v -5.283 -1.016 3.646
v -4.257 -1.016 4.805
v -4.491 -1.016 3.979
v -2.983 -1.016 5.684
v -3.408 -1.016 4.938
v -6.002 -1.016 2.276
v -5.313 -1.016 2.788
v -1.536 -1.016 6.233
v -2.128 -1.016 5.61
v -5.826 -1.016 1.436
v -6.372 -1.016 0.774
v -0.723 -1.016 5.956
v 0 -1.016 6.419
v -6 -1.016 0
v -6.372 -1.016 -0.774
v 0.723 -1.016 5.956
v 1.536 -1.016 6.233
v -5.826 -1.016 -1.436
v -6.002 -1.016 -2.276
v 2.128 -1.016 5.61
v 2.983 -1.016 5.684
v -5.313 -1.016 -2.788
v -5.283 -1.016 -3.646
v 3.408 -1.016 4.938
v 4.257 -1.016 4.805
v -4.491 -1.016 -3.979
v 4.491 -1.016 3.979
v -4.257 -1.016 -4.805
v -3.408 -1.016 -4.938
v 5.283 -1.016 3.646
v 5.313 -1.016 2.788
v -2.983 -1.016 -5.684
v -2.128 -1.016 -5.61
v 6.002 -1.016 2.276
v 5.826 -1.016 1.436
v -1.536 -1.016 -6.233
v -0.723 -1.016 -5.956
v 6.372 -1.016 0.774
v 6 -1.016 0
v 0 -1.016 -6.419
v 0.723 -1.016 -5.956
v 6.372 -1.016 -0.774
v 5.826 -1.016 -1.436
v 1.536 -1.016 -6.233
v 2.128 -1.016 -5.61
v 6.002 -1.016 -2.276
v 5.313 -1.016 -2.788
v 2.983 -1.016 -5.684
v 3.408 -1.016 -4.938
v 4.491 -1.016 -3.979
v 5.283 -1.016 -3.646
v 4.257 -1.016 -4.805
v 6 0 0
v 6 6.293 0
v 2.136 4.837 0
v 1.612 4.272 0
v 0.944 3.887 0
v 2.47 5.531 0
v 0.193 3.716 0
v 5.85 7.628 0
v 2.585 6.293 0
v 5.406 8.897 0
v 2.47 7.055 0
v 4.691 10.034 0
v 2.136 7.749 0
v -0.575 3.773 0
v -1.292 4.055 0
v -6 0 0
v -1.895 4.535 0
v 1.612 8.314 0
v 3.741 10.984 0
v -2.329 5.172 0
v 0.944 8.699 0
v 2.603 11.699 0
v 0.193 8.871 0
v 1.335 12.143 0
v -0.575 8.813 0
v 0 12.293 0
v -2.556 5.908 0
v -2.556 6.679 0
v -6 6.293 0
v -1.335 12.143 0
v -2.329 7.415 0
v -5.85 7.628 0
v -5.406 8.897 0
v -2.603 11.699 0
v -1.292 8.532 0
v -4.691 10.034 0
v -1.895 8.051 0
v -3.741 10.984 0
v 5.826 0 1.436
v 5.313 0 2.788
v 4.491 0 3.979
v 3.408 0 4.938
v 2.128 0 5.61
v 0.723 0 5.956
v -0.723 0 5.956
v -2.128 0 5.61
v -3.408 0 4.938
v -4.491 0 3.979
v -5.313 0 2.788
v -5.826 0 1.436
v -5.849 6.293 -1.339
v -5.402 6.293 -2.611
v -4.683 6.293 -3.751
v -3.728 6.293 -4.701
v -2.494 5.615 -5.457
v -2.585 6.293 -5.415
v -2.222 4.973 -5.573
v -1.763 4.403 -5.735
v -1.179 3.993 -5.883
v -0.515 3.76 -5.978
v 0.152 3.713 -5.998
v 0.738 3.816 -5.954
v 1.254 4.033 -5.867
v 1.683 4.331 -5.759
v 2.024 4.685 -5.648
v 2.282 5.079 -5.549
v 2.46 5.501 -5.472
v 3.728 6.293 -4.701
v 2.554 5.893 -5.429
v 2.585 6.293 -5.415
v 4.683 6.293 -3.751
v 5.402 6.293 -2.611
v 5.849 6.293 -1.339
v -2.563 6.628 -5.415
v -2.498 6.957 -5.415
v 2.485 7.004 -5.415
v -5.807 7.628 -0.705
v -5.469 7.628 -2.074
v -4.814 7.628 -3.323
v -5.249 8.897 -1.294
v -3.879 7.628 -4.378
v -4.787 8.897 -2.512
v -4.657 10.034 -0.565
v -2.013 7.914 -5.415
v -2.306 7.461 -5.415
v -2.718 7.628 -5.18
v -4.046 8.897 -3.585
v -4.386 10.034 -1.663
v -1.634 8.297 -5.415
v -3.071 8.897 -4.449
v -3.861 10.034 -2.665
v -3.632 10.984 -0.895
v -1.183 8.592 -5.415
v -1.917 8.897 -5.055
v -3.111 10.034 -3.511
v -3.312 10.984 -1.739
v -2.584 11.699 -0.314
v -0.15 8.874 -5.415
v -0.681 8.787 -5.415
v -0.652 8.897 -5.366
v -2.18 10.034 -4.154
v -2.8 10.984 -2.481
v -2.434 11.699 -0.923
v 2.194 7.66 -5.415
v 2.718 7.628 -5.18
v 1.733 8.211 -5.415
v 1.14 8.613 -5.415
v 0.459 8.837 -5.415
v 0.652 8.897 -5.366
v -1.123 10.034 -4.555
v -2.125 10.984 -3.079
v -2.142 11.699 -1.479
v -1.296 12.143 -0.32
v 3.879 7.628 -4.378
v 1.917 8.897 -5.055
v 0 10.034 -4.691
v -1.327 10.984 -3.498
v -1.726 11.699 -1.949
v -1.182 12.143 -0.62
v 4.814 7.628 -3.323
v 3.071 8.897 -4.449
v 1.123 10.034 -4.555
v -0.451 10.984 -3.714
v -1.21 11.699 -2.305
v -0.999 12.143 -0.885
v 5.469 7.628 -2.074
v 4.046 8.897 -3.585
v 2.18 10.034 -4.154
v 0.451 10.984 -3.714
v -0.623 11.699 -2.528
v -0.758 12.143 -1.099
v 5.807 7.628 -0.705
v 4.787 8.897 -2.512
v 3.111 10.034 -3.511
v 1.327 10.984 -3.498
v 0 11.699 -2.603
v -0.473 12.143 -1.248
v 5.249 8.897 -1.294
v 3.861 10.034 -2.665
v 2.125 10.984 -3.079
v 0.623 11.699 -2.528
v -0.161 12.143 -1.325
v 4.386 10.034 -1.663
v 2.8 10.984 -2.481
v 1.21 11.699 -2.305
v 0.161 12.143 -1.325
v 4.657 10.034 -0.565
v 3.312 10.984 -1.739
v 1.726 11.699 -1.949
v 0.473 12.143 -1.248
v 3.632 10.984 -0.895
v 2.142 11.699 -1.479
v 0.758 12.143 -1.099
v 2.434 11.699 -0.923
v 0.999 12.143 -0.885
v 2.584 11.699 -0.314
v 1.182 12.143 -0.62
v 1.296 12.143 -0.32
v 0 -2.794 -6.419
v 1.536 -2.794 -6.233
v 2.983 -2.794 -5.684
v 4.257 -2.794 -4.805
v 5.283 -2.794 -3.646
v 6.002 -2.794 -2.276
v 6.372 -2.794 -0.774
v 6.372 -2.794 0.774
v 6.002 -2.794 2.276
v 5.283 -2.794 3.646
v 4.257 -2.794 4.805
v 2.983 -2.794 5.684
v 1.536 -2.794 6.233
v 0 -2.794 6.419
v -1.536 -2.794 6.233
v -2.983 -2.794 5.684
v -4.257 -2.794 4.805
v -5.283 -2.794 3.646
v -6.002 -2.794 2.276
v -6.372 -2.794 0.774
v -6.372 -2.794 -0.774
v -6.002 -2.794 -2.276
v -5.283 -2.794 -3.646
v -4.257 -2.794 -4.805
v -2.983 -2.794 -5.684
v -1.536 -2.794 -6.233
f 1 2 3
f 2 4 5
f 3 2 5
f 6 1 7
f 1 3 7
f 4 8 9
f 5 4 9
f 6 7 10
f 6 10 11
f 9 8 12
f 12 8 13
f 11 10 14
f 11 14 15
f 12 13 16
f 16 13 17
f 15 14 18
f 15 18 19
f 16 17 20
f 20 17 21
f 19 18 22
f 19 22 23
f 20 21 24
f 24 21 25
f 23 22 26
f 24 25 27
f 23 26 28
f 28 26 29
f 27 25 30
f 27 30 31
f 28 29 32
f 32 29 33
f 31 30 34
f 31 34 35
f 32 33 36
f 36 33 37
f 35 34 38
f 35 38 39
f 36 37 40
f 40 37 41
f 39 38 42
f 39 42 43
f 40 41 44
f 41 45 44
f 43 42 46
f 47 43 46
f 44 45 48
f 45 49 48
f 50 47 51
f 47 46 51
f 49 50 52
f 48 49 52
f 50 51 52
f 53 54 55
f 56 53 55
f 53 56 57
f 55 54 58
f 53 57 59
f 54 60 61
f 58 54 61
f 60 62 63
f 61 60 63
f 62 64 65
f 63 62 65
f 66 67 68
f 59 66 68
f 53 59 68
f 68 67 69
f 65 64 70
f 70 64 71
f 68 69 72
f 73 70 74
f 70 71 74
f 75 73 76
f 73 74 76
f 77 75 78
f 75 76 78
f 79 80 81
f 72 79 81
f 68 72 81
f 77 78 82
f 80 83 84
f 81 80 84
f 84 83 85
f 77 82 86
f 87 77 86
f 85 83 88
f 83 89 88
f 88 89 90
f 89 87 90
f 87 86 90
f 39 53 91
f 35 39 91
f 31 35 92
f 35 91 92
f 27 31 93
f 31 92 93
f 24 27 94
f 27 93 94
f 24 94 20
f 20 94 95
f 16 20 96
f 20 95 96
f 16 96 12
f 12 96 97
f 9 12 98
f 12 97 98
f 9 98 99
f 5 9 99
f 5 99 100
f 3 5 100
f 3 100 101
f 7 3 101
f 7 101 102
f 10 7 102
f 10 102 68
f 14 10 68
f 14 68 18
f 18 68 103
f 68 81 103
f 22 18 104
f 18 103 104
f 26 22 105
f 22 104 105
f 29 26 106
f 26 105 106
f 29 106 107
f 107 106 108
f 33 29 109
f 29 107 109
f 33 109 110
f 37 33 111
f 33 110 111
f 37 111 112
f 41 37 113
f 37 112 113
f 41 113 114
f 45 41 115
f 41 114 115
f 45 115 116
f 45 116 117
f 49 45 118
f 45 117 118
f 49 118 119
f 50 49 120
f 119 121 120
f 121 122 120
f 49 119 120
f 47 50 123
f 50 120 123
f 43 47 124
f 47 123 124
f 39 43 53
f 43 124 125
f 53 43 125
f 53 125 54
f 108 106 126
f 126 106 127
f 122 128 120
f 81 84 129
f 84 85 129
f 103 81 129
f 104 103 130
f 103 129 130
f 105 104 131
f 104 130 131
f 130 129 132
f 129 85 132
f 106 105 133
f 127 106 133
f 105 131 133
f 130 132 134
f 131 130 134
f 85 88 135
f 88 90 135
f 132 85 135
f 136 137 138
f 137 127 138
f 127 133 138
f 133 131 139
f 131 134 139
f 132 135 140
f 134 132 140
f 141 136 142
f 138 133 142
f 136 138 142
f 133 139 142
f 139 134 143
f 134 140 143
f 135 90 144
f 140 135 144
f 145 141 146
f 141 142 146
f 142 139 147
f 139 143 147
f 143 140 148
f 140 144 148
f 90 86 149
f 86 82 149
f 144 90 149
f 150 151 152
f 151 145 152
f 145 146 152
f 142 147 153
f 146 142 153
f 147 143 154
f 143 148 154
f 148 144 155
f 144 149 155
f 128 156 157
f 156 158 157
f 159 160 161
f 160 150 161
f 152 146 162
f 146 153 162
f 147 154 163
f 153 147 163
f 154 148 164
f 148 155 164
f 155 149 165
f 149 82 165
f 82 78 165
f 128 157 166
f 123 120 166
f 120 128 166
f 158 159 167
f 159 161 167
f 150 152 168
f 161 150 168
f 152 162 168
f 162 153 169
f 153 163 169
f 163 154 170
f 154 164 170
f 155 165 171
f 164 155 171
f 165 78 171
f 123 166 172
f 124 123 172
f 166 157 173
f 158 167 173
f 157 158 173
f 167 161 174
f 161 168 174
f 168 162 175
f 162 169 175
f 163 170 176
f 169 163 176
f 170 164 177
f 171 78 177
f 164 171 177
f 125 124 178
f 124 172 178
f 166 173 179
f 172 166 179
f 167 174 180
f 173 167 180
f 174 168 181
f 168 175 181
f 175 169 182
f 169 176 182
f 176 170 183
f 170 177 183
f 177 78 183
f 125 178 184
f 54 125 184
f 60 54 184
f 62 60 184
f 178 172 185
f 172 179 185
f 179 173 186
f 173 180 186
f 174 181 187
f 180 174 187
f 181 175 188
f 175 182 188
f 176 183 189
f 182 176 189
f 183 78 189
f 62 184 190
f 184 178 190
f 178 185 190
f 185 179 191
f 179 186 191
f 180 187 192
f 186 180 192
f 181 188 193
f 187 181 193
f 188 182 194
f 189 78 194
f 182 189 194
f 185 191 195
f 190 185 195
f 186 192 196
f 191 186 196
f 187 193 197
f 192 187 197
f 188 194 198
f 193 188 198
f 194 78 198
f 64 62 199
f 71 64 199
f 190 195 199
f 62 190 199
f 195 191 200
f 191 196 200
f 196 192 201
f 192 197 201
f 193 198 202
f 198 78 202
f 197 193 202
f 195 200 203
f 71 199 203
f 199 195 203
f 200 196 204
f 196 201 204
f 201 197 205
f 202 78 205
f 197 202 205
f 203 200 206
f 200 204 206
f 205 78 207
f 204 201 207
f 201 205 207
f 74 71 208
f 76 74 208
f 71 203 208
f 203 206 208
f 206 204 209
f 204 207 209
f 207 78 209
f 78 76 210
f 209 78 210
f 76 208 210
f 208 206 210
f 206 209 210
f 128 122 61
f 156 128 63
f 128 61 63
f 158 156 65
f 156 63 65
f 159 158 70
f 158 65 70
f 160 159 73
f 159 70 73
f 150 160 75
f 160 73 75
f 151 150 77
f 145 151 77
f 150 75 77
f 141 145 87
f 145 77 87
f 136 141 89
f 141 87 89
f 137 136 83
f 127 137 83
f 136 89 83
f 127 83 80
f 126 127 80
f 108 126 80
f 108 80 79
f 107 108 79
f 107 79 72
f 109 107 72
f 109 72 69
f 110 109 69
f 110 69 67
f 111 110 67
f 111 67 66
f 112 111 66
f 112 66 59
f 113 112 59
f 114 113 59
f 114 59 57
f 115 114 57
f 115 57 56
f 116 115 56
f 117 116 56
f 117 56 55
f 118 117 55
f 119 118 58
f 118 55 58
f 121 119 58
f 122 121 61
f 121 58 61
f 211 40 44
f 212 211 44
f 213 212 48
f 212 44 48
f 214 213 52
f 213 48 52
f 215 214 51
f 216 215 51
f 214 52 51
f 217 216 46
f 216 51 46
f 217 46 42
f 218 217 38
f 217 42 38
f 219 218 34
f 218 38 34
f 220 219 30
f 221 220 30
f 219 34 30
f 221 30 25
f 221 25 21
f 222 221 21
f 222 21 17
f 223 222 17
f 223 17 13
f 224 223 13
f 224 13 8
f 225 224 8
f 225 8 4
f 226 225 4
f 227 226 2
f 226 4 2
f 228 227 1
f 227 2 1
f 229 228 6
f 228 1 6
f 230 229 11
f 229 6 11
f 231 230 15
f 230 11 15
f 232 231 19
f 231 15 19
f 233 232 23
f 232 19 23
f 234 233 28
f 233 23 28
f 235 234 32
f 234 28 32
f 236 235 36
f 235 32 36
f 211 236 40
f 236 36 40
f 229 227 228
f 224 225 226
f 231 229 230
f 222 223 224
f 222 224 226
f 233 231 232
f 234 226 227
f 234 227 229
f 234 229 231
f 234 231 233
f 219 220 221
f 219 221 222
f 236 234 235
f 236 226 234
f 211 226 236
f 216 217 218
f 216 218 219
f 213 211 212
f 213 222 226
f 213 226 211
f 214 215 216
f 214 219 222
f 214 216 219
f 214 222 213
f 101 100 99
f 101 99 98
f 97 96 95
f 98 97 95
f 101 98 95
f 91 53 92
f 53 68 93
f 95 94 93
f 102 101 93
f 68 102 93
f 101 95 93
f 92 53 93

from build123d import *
from build123d.topology import SkipClean

# Parameters (mm, degrees)
REVOLVE1_ANGLE = 180
SKETCH2_R      = 6
EXTRUDE1_DEPTH = 1.016
SKETCH3_R      = 6.419039945
EXTRUDE2_DEPTH = 1.778
SKETCH4_R      = 2.584873193
EXTRUDE3_DEPTH = 16.281774039


with BuildPart() as part:
    # Sketch1 → Revolve1 (revolve)
    with BuildSketch(Plane.XY):
        with BuildLine():
            Line((-6, 0), (-6, 6.293269303))
            ThreePointArc((-6, 6.293269303), (-4.242640687, 10.535909991), (0, 12.293269303))
            Line((0, 12.293269303), (0, 0))
            Line((0, 0), (-6, 0))
        make_face()
    revolve(axis=Axis((0, 12.293269303, 0), (0, -1, 0)), revolution_arc=REVOLVE1_ANGLE)

    # Sketch2 → Extrude1 (add)
    with BuildSketch(Plane.XZ):
        Circle(SKETCH2_R)
    extrude(amount=EXTRUDE1_DEPTH)

    # Sketch3 → Extrude2 (add)
    with BuildSketch(Plane.XZ.offset(1.016)):
        with Locations(Location((0, 0, 0), (0, 0, 270))):
            Circle(SKETCH3_R)
    extrude(amount=EXTRUDE2_DEPTH)

    # Sketch4 → Extrude3 (cut, through all)
    with SkipClean():  # the faces are left unmerged after this step: merging them gives an invalid solid
        with BuildSketch(Plane.XY):
            with Locations((0, 6.293269303)):
                Circle(SKETCH4_R)
        extrude(amount=-EXTRUDE3_DEPTH, mode=Mode.SUBTRACT)


solid = part.part
